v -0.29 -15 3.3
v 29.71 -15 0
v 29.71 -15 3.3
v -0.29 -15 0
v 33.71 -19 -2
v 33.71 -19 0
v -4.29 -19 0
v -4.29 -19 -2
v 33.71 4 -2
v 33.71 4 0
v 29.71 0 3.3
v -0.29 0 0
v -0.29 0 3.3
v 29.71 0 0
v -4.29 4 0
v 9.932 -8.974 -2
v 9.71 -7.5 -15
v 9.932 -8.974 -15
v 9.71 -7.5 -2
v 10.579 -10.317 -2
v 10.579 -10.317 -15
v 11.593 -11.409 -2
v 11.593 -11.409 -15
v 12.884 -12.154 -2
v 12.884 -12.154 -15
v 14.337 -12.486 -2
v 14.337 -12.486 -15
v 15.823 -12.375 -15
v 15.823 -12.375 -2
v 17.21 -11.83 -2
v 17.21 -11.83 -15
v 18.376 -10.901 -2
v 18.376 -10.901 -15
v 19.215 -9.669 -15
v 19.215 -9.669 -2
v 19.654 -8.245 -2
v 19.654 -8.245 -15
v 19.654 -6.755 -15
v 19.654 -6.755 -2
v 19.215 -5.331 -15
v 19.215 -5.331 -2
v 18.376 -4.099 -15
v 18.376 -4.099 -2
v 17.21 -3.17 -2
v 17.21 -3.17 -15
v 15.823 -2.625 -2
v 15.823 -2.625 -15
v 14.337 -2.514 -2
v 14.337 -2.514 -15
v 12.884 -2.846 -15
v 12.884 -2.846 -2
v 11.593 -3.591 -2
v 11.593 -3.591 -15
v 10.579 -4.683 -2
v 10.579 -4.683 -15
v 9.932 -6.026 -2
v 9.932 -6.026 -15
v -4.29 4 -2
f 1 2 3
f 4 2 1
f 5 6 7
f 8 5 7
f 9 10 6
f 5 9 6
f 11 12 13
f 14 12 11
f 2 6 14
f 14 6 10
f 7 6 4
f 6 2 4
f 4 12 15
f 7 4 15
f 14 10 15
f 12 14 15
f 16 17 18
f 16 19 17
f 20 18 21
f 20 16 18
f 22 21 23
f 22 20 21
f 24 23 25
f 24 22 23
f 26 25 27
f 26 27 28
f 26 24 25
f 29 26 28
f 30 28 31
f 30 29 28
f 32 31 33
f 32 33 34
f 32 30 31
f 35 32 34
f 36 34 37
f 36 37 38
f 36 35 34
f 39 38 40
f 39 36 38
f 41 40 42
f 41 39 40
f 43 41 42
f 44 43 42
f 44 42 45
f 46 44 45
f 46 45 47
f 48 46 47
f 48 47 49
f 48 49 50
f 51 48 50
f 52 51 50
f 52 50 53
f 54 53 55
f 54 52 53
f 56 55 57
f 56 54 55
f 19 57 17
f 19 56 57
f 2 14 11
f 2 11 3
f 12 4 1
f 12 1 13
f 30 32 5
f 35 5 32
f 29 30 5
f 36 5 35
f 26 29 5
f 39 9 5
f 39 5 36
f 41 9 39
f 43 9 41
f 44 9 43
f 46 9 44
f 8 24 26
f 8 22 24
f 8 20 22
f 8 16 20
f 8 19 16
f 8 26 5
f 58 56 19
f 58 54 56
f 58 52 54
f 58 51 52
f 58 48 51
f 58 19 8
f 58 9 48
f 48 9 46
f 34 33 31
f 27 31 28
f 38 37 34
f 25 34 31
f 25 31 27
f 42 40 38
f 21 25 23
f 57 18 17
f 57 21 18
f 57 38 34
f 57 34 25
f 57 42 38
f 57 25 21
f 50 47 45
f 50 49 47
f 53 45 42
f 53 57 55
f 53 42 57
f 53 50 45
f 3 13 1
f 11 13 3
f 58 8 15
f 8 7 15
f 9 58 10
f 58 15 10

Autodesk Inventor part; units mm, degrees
ref_plane "YZ Plane" through (0, 0, 0) normal (1, 0, 0) x (0, 1, 0)
ref_plane "XZ Plane" through (0, 0, 0) normal (0, 1, 0) x (-1, 0, 0)
ref_plane "XY Plane" through (0, 0, 0) normal (0, 0, 1) x (1, 0, 0)
sketch "Boceto1" plane through (0, 0, 0) normal (0, 0, 1) x (1, 0, 0)
  line L0 (-0.2897, 0) -> (29.7103, 0)
  line L1 (29.7103, 0) -> (29.7103, -15)
  line L2 (29.7103, -15) -> (-0.2897, -15)
  line L3 (-0.2897, -15) -> (-0.2897, 0)
  point P0 (0, 0)
  dimension "d0" = 30
  dimension "d1" = 15
extrude "Extrusión1" add sketch "Boceto1" along normal blind 3.3
sketch "Boceto2" plane through (0, 0, 0) normal (0, 0, -1) x (-1, 0, 0)
  line L0 (-29.7103, -15) -> (0.2897, -15) projected
  line L1 (0.2897, 0) -> (-29.7103, 0) projected
  line L2 (-29.7103, 0) -> (-29.7103, -15) projected
  line L3 (-29.7103, -15) -> (0.2897, -15) projected
  line L4 (0.2897, -15) -> (0.2897, 0) projected
  line L5 (4.2897, 4) -> (-33.7103, 4)
  line L6 (-33.7103, 4) -> (-33.7103, -19)
  line L7 (-33.7103, -19) -> (4.2897, -19)
  line L8 (4.2897, -19) -> (4.2897, 4)
  point P0 (0, 0)
  dimension "d4" = 4
extrude "Extrusión2" add sketch "Boceto2" along normal blind 2 contours L2 L1 L4 L0 | L8 L7 L6 L5
sketch "Boceto3" plane through (0, 0, -2) normal (0, 0, -1) x (-1, 0, 0)
  line L0 (4.2897, 4) -> (-33.7103, 4) projected
  line L1 (-14.7103, 4) -> (-14.7103, -19)
  line L2 (-33.7103, -19) -> (4.2897, -19) projected
  circle A0 centre (-14.7103, -7.5) radius 5
  point P0 (0, 0)
  dimension "d7" = 10
extrude "Extrusión3" add sketch "Boceto3" along normal blind 13
properties part number "boton2"
